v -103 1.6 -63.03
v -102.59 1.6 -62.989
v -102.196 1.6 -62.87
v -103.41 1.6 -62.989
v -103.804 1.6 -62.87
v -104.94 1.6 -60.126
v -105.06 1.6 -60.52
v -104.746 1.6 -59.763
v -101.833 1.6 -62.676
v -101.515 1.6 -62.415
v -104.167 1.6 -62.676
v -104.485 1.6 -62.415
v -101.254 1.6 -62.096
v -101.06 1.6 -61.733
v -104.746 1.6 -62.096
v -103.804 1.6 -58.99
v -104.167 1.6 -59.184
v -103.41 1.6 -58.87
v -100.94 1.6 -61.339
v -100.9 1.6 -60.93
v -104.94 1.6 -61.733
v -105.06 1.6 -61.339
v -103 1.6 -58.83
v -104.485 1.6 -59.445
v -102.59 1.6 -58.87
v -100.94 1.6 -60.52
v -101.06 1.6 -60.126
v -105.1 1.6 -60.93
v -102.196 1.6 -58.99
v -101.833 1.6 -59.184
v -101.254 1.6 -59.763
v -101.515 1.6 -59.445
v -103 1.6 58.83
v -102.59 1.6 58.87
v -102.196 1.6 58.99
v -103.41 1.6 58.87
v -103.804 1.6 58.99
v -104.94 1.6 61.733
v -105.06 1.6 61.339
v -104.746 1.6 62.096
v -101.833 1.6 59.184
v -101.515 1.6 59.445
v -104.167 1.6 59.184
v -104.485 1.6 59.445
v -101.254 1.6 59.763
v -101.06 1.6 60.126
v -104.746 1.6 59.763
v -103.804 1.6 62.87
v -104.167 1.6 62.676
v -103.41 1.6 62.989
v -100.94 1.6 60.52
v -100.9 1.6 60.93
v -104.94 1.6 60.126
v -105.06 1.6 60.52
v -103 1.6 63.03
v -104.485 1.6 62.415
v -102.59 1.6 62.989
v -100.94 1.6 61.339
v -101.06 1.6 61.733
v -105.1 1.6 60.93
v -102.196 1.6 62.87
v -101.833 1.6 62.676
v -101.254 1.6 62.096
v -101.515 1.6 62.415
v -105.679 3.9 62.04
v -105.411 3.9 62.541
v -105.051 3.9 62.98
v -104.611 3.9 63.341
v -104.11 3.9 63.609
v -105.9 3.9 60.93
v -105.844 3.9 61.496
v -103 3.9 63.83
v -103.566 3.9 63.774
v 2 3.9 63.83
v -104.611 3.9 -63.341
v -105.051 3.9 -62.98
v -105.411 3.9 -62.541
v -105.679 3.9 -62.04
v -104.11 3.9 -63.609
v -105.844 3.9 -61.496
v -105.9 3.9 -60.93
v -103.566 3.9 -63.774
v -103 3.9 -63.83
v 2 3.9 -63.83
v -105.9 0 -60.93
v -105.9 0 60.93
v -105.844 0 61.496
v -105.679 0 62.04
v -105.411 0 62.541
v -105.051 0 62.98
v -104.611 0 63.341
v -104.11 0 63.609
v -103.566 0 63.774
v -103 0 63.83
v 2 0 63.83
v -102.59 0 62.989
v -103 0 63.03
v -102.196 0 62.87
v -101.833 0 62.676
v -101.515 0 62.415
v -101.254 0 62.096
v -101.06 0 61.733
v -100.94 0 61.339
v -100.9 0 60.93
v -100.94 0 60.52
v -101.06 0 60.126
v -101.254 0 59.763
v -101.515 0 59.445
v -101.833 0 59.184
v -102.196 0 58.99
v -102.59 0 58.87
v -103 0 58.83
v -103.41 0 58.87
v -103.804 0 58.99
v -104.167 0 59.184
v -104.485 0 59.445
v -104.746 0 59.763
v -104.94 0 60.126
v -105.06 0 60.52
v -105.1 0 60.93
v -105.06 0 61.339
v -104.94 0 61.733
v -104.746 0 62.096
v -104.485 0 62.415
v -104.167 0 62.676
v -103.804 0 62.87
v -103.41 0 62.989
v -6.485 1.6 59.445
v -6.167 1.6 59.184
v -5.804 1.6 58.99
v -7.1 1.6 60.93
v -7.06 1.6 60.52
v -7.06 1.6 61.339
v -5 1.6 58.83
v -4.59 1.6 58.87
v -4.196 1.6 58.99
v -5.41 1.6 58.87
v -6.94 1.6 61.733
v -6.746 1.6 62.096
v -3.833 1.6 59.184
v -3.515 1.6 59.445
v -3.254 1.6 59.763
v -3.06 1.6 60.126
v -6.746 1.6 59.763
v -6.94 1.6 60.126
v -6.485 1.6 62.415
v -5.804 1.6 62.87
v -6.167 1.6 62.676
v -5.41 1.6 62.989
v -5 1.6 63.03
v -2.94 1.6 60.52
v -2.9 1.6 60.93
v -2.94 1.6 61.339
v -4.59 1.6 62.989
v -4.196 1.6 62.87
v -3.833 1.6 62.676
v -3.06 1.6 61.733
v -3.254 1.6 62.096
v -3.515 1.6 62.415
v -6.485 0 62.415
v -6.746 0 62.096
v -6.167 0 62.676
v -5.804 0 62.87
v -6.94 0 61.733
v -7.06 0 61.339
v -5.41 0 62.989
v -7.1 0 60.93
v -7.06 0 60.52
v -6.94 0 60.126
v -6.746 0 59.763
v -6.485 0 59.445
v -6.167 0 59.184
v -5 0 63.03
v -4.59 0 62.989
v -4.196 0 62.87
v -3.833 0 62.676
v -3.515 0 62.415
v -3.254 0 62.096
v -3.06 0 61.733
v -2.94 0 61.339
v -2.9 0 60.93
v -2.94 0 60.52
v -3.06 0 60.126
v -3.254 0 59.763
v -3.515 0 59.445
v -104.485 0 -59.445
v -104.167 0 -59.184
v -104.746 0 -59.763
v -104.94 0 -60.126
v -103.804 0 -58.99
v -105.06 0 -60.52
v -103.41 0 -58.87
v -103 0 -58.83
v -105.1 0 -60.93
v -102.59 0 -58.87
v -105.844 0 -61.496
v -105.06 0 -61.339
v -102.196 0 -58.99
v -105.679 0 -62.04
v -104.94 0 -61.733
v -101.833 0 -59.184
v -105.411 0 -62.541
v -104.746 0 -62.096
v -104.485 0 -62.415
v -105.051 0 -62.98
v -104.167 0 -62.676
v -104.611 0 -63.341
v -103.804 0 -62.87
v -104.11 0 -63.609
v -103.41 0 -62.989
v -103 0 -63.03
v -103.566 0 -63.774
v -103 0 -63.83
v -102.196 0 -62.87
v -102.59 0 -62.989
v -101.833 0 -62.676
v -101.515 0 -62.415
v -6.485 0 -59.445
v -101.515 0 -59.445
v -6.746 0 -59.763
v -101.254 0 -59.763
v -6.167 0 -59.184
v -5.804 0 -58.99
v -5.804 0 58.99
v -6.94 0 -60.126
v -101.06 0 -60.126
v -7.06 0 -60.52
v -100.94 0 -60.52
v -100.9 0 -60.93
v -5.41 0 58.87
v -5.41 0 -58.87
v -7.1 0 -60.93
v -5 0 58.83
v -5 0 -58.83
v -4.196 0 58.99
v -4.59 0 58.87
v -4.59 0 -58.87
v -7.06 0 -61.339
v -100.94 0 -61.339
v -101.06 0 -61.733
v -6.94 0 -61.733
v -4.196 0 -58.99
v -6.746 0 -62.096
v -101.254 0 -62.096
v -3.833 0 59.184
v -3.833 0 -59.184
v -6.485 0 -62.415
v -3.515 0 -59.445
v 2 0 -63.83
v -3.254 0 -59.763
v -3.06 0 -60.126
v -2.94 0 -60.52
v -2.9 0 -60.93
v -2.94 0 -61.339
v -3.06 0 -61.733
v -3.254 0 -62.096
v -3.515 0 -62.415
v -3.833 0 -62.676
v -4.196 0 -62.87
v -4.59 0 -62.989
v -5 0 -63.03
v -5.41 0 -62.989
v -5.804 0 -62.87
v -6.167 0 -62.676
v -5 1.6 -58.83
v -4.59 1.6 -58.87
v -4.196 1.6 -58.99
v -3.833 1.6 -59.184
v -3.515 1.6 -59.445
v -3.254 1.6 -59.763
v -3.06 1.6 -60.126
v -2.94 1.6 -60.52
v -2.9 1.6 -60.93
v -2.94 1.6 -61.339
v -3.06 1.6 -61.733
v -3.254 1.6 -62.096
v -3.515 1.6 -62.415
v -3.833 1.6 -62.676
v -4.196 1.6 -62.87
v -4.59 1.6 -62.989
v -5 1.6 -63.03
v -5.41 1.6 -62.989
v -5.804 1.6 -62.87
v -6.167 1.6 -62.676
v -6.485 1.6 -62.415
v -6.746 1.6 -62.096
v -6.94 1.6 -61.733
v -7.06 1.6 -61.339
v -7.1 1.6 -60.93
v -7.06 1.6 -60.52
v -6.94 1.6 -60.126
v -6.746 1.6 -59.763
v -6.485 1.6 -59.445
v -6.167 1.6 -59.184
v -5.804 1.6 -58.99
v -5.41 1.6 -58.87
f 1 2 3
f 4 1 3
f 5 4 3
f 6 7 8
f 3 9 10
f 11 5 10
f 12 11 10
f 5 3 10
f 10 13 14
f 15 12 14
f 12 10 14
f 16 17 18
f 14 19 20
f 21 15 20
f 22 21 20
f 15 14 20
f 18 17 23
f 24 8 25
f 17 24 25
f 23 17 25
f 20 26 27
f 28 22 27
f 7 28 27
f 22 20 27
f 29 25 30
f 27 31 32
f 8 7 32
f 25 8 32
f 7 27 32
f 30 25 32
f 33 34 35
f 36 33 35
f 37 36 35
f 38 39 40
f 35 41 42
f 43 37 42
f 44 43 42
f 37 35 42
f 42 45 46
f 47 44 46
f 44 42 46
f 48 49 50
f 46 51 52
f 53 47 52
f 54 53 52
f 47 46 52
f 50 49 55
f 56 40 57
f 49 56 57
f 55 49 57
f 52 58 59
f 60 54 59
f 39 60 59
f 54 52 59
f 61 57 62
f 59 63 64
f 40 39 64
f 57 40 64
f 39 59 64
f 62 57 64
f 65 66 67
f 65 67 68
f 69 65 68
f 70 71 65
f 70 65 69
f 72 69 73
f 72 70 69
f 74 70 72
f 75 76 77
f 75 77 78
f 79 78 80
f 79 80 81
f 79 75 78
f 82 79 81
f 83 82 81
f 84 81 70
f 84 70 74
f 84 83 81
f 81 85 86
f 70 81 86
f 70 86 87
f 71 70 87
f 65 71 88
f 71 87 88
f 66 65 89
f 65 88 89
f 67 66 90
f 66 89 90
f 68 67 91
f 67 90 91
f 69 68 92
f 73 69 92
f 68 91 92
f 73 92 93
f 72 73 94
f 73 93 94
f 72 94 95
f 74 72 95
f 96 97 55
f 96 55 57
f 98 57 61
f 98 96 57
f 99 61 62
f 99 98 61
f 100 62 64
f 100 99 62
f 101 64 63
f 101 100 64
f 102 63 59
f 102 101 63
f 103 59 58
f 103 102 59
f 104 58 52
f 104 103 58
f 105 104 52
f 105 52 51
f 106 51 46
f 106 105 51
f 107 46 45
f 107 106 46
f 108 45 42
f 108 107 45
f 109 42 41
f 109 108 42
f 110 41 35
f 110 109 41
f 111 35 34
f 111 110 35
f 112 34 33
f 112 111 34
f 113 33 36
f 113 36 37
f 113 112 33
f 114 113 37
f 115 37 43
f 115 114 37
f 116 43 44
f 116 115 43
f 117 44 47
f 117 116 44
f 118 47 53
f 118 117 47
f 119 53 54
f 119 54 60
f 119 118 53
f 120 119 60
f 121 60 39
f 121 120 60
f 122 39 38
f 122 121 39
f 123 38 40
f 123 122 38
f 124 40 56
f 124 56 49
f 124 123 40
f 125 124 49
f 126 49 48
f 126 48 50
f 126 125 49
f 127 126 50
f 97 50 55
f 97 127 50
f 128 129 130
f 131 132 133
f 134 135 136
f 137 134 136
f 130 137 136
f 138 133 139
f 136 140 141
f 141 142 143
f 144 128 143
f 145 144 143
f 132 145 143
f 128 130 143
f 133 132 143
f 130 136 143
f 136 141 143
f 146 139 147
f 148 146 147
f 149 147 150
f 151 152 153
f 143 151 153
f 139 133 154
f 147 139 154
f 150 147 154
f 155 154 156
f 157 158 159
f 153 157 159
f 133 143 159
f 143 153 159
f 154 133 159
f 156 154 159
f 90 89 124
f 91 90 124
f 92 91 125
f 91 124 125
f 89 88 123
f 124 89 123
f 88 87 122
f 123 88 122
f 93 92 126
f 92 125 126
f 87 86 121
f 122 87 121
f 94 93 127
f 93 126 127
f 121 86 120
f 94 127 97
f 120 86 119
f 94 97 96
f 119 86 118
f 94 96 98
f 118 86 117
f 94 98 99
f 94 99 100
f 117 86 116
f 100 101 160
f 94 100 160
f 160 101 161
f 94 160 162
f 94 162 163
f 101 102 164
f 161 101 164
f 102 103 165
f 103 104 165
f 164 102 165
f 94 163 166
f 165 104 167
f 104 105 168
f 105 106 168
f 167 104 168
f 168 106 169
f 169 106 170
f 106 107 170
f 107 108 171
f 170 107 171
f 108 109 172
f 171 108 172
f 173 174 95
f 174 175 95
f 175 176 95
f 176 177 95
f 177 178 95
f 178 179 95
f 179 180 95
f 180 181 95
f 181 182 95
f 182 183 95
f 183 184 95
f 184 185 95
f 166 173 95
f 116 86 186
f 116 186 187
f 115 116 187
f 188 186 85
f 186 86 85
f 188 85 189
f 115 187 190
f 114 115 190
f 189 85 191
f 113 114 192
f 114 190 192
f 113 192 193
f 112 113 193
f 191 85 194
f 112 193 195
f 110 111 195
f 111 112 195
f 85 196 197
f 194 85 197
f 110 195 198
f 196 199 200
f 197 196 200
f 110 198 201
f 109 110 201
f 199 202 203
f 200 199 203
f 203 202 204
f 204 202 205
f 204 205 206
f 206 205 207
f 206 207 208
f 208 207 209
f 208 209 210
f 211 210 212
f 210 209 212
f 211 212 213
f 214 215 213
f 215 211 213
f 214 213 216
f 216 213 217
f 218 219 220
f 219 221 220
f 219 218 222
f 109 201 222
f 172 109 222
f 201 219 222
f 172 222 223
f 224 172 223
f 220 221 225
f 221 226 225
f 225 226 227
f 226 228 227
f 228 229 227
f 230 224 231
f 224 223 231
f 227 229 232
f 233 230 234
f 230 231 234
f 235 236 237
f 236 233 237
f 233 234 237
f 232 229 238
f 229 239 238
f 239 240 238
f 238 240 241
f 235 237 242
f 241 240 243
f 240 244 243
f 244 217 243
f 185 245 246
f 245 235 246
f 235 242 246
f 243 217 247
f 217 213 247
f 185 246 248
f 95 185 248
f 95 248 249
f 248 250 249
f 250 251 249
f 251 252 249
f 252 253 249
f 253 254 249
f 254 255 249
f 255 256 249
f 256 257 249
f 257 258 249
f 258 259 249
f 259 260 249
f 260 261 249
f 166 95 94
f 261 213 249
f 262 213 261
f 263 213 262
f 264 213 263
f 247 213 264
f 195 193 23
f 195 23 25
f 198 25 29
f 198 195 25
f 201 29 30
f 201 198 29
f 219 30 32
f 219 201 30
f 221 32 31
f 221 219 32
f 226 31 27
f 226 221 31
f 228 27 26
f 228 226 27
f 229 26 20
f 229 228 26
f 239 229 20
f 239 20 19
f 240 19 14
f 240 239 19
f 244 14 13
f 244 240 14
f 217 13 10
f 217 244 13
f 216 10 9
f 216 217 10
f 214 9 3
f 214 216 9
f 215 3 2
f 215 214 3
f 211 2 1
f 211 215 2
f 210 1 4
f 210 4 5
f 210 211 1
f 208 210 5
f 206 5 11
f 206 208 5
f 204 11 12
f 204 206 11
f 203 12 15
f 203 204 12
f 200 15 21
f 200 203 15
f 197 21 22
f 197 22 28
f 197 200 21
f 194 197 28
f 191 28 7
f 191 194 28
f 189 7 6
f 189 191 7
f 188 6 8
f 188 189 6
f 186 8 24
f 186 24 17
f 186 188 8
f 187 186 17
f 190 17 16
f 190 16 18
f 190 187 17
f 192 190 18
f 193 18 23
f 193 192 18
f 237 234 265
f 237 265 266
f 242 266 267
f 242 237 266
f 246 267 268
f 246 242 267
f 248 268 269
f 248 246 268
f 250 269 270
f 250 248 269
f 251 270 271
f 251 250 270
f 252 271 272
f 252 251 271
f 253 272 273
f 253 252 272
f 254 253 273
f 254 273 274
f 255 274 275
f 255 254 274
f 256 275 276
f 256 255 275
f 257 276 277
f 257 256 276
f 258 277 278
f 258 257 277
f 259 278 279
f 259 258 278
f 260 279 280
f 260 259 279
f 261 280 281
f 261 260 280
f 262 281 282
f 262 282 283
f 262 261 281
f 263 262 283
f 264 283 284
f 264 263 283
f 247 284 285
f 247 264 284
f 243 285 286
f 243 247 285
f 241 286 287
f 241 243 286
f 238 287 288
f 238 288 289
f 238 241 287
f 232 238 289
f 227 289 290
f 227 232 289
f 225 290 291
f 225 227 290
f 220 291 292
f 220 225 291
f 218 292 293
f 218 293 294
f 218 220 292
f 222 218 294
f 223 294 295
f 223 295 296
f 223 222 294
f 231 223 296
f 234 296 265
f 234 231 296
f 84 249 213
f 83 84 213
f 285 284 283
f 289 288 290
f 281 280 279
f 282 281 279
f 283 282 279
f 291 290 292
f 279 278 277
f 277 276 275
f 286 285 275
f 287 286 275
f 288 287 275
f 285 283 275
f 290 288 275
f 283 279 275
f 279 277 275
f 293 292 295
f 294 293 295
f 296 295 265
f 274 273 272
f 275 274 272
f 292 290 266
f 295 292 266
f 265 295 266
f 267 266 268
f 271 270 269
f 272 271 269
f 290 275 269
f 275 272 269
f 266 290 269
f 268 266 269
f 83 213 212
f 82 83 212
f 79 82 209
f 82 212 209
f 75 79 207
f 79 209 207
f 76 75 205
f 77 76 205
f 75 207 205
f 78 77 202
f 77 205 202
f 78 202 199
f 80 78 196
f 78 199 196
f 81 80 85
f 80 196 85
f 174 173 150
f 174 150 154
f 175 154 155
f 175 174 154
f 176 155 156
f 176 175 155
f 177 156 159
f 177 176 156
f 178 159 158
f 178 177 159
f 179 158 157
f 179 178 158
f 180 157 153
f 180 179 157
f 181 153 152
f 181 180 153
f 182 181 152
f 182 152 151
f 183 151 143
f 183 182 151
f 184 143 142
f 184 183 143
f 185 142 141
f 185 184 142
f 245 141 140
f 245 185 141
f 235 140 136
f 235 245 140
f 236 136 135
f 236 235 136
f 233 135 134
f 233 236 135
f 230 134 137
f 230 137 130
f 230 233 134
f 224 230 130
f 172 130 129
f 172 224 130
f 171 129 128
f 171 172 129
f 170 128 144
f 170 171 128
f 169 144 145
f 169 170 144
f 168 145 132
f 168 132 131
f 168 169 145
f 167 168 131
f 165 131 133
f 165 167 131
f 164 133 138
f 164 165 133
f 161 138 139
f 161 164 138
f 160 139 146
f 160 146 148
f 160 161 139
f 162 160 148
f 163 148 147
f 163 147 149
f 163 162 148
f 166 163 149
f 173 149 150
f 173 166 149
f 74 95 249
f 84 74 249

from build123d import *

# Parameters (mm, degrees)
BOSS_EXTRUDE1_DEPTH = 3.9
SKETCH1_6_R         = 2.1
CUT_EXTRUDE1_DEPTH  = 1.6


with BuildPart() as part:
    # Sketch1 → Boss-Extrude1 (new body)
    with BuildSketch(Plane(origin=(0, 0, 0), x_dir=(1, 0, 0), z_dir=(0, 1, 0))):
        with BuildLine():
            Line((-105.9, 60.929794432), (-105.9, -60.929794385))
            ThreePointArc((-105.9, -60.929794385), (-105.050609665, -62.980404051), (-103, -63.829794385))
            Line((-103, -63.829794385), (2, -63.829794385))
            Line((2, -63.829794385), (2, 63.829794385))
            Line((2, 63.829794385), (-103, 63.829794385))
            ThreePointArc((-103, 63.829794385), (-105.050609649, 62.980404067), (-105.9, 60.929794432))
        make_face()
    extrude(amount=BOSS_EXTRUDE1_DEPTH)

    # Sketch1<6> → Cut-Extrude1 (cut)
    with BuildSketch(Plane(origin=(0, 0, 0), x_dir=(1, 0, 0), z_dir=(0, 1, 0))):
        with Locations((-103, 60.929794385)):
            Circle(SKETCH1_6_R)
        with Locations((-5, 60.929794385)):
            Circle(SKETCH1_6_R)
        with Locations((-5, -60.929794385)):
            Circle(SKETCH1_6_R)
        with Locations((-103, -60.929794385)):
            Circle(SKETCH1_6_R)
    extrude(amount=CUT_EXTRUDE1_DEPTH, mode=Mode.SUBTRACT)


solid = part.part
